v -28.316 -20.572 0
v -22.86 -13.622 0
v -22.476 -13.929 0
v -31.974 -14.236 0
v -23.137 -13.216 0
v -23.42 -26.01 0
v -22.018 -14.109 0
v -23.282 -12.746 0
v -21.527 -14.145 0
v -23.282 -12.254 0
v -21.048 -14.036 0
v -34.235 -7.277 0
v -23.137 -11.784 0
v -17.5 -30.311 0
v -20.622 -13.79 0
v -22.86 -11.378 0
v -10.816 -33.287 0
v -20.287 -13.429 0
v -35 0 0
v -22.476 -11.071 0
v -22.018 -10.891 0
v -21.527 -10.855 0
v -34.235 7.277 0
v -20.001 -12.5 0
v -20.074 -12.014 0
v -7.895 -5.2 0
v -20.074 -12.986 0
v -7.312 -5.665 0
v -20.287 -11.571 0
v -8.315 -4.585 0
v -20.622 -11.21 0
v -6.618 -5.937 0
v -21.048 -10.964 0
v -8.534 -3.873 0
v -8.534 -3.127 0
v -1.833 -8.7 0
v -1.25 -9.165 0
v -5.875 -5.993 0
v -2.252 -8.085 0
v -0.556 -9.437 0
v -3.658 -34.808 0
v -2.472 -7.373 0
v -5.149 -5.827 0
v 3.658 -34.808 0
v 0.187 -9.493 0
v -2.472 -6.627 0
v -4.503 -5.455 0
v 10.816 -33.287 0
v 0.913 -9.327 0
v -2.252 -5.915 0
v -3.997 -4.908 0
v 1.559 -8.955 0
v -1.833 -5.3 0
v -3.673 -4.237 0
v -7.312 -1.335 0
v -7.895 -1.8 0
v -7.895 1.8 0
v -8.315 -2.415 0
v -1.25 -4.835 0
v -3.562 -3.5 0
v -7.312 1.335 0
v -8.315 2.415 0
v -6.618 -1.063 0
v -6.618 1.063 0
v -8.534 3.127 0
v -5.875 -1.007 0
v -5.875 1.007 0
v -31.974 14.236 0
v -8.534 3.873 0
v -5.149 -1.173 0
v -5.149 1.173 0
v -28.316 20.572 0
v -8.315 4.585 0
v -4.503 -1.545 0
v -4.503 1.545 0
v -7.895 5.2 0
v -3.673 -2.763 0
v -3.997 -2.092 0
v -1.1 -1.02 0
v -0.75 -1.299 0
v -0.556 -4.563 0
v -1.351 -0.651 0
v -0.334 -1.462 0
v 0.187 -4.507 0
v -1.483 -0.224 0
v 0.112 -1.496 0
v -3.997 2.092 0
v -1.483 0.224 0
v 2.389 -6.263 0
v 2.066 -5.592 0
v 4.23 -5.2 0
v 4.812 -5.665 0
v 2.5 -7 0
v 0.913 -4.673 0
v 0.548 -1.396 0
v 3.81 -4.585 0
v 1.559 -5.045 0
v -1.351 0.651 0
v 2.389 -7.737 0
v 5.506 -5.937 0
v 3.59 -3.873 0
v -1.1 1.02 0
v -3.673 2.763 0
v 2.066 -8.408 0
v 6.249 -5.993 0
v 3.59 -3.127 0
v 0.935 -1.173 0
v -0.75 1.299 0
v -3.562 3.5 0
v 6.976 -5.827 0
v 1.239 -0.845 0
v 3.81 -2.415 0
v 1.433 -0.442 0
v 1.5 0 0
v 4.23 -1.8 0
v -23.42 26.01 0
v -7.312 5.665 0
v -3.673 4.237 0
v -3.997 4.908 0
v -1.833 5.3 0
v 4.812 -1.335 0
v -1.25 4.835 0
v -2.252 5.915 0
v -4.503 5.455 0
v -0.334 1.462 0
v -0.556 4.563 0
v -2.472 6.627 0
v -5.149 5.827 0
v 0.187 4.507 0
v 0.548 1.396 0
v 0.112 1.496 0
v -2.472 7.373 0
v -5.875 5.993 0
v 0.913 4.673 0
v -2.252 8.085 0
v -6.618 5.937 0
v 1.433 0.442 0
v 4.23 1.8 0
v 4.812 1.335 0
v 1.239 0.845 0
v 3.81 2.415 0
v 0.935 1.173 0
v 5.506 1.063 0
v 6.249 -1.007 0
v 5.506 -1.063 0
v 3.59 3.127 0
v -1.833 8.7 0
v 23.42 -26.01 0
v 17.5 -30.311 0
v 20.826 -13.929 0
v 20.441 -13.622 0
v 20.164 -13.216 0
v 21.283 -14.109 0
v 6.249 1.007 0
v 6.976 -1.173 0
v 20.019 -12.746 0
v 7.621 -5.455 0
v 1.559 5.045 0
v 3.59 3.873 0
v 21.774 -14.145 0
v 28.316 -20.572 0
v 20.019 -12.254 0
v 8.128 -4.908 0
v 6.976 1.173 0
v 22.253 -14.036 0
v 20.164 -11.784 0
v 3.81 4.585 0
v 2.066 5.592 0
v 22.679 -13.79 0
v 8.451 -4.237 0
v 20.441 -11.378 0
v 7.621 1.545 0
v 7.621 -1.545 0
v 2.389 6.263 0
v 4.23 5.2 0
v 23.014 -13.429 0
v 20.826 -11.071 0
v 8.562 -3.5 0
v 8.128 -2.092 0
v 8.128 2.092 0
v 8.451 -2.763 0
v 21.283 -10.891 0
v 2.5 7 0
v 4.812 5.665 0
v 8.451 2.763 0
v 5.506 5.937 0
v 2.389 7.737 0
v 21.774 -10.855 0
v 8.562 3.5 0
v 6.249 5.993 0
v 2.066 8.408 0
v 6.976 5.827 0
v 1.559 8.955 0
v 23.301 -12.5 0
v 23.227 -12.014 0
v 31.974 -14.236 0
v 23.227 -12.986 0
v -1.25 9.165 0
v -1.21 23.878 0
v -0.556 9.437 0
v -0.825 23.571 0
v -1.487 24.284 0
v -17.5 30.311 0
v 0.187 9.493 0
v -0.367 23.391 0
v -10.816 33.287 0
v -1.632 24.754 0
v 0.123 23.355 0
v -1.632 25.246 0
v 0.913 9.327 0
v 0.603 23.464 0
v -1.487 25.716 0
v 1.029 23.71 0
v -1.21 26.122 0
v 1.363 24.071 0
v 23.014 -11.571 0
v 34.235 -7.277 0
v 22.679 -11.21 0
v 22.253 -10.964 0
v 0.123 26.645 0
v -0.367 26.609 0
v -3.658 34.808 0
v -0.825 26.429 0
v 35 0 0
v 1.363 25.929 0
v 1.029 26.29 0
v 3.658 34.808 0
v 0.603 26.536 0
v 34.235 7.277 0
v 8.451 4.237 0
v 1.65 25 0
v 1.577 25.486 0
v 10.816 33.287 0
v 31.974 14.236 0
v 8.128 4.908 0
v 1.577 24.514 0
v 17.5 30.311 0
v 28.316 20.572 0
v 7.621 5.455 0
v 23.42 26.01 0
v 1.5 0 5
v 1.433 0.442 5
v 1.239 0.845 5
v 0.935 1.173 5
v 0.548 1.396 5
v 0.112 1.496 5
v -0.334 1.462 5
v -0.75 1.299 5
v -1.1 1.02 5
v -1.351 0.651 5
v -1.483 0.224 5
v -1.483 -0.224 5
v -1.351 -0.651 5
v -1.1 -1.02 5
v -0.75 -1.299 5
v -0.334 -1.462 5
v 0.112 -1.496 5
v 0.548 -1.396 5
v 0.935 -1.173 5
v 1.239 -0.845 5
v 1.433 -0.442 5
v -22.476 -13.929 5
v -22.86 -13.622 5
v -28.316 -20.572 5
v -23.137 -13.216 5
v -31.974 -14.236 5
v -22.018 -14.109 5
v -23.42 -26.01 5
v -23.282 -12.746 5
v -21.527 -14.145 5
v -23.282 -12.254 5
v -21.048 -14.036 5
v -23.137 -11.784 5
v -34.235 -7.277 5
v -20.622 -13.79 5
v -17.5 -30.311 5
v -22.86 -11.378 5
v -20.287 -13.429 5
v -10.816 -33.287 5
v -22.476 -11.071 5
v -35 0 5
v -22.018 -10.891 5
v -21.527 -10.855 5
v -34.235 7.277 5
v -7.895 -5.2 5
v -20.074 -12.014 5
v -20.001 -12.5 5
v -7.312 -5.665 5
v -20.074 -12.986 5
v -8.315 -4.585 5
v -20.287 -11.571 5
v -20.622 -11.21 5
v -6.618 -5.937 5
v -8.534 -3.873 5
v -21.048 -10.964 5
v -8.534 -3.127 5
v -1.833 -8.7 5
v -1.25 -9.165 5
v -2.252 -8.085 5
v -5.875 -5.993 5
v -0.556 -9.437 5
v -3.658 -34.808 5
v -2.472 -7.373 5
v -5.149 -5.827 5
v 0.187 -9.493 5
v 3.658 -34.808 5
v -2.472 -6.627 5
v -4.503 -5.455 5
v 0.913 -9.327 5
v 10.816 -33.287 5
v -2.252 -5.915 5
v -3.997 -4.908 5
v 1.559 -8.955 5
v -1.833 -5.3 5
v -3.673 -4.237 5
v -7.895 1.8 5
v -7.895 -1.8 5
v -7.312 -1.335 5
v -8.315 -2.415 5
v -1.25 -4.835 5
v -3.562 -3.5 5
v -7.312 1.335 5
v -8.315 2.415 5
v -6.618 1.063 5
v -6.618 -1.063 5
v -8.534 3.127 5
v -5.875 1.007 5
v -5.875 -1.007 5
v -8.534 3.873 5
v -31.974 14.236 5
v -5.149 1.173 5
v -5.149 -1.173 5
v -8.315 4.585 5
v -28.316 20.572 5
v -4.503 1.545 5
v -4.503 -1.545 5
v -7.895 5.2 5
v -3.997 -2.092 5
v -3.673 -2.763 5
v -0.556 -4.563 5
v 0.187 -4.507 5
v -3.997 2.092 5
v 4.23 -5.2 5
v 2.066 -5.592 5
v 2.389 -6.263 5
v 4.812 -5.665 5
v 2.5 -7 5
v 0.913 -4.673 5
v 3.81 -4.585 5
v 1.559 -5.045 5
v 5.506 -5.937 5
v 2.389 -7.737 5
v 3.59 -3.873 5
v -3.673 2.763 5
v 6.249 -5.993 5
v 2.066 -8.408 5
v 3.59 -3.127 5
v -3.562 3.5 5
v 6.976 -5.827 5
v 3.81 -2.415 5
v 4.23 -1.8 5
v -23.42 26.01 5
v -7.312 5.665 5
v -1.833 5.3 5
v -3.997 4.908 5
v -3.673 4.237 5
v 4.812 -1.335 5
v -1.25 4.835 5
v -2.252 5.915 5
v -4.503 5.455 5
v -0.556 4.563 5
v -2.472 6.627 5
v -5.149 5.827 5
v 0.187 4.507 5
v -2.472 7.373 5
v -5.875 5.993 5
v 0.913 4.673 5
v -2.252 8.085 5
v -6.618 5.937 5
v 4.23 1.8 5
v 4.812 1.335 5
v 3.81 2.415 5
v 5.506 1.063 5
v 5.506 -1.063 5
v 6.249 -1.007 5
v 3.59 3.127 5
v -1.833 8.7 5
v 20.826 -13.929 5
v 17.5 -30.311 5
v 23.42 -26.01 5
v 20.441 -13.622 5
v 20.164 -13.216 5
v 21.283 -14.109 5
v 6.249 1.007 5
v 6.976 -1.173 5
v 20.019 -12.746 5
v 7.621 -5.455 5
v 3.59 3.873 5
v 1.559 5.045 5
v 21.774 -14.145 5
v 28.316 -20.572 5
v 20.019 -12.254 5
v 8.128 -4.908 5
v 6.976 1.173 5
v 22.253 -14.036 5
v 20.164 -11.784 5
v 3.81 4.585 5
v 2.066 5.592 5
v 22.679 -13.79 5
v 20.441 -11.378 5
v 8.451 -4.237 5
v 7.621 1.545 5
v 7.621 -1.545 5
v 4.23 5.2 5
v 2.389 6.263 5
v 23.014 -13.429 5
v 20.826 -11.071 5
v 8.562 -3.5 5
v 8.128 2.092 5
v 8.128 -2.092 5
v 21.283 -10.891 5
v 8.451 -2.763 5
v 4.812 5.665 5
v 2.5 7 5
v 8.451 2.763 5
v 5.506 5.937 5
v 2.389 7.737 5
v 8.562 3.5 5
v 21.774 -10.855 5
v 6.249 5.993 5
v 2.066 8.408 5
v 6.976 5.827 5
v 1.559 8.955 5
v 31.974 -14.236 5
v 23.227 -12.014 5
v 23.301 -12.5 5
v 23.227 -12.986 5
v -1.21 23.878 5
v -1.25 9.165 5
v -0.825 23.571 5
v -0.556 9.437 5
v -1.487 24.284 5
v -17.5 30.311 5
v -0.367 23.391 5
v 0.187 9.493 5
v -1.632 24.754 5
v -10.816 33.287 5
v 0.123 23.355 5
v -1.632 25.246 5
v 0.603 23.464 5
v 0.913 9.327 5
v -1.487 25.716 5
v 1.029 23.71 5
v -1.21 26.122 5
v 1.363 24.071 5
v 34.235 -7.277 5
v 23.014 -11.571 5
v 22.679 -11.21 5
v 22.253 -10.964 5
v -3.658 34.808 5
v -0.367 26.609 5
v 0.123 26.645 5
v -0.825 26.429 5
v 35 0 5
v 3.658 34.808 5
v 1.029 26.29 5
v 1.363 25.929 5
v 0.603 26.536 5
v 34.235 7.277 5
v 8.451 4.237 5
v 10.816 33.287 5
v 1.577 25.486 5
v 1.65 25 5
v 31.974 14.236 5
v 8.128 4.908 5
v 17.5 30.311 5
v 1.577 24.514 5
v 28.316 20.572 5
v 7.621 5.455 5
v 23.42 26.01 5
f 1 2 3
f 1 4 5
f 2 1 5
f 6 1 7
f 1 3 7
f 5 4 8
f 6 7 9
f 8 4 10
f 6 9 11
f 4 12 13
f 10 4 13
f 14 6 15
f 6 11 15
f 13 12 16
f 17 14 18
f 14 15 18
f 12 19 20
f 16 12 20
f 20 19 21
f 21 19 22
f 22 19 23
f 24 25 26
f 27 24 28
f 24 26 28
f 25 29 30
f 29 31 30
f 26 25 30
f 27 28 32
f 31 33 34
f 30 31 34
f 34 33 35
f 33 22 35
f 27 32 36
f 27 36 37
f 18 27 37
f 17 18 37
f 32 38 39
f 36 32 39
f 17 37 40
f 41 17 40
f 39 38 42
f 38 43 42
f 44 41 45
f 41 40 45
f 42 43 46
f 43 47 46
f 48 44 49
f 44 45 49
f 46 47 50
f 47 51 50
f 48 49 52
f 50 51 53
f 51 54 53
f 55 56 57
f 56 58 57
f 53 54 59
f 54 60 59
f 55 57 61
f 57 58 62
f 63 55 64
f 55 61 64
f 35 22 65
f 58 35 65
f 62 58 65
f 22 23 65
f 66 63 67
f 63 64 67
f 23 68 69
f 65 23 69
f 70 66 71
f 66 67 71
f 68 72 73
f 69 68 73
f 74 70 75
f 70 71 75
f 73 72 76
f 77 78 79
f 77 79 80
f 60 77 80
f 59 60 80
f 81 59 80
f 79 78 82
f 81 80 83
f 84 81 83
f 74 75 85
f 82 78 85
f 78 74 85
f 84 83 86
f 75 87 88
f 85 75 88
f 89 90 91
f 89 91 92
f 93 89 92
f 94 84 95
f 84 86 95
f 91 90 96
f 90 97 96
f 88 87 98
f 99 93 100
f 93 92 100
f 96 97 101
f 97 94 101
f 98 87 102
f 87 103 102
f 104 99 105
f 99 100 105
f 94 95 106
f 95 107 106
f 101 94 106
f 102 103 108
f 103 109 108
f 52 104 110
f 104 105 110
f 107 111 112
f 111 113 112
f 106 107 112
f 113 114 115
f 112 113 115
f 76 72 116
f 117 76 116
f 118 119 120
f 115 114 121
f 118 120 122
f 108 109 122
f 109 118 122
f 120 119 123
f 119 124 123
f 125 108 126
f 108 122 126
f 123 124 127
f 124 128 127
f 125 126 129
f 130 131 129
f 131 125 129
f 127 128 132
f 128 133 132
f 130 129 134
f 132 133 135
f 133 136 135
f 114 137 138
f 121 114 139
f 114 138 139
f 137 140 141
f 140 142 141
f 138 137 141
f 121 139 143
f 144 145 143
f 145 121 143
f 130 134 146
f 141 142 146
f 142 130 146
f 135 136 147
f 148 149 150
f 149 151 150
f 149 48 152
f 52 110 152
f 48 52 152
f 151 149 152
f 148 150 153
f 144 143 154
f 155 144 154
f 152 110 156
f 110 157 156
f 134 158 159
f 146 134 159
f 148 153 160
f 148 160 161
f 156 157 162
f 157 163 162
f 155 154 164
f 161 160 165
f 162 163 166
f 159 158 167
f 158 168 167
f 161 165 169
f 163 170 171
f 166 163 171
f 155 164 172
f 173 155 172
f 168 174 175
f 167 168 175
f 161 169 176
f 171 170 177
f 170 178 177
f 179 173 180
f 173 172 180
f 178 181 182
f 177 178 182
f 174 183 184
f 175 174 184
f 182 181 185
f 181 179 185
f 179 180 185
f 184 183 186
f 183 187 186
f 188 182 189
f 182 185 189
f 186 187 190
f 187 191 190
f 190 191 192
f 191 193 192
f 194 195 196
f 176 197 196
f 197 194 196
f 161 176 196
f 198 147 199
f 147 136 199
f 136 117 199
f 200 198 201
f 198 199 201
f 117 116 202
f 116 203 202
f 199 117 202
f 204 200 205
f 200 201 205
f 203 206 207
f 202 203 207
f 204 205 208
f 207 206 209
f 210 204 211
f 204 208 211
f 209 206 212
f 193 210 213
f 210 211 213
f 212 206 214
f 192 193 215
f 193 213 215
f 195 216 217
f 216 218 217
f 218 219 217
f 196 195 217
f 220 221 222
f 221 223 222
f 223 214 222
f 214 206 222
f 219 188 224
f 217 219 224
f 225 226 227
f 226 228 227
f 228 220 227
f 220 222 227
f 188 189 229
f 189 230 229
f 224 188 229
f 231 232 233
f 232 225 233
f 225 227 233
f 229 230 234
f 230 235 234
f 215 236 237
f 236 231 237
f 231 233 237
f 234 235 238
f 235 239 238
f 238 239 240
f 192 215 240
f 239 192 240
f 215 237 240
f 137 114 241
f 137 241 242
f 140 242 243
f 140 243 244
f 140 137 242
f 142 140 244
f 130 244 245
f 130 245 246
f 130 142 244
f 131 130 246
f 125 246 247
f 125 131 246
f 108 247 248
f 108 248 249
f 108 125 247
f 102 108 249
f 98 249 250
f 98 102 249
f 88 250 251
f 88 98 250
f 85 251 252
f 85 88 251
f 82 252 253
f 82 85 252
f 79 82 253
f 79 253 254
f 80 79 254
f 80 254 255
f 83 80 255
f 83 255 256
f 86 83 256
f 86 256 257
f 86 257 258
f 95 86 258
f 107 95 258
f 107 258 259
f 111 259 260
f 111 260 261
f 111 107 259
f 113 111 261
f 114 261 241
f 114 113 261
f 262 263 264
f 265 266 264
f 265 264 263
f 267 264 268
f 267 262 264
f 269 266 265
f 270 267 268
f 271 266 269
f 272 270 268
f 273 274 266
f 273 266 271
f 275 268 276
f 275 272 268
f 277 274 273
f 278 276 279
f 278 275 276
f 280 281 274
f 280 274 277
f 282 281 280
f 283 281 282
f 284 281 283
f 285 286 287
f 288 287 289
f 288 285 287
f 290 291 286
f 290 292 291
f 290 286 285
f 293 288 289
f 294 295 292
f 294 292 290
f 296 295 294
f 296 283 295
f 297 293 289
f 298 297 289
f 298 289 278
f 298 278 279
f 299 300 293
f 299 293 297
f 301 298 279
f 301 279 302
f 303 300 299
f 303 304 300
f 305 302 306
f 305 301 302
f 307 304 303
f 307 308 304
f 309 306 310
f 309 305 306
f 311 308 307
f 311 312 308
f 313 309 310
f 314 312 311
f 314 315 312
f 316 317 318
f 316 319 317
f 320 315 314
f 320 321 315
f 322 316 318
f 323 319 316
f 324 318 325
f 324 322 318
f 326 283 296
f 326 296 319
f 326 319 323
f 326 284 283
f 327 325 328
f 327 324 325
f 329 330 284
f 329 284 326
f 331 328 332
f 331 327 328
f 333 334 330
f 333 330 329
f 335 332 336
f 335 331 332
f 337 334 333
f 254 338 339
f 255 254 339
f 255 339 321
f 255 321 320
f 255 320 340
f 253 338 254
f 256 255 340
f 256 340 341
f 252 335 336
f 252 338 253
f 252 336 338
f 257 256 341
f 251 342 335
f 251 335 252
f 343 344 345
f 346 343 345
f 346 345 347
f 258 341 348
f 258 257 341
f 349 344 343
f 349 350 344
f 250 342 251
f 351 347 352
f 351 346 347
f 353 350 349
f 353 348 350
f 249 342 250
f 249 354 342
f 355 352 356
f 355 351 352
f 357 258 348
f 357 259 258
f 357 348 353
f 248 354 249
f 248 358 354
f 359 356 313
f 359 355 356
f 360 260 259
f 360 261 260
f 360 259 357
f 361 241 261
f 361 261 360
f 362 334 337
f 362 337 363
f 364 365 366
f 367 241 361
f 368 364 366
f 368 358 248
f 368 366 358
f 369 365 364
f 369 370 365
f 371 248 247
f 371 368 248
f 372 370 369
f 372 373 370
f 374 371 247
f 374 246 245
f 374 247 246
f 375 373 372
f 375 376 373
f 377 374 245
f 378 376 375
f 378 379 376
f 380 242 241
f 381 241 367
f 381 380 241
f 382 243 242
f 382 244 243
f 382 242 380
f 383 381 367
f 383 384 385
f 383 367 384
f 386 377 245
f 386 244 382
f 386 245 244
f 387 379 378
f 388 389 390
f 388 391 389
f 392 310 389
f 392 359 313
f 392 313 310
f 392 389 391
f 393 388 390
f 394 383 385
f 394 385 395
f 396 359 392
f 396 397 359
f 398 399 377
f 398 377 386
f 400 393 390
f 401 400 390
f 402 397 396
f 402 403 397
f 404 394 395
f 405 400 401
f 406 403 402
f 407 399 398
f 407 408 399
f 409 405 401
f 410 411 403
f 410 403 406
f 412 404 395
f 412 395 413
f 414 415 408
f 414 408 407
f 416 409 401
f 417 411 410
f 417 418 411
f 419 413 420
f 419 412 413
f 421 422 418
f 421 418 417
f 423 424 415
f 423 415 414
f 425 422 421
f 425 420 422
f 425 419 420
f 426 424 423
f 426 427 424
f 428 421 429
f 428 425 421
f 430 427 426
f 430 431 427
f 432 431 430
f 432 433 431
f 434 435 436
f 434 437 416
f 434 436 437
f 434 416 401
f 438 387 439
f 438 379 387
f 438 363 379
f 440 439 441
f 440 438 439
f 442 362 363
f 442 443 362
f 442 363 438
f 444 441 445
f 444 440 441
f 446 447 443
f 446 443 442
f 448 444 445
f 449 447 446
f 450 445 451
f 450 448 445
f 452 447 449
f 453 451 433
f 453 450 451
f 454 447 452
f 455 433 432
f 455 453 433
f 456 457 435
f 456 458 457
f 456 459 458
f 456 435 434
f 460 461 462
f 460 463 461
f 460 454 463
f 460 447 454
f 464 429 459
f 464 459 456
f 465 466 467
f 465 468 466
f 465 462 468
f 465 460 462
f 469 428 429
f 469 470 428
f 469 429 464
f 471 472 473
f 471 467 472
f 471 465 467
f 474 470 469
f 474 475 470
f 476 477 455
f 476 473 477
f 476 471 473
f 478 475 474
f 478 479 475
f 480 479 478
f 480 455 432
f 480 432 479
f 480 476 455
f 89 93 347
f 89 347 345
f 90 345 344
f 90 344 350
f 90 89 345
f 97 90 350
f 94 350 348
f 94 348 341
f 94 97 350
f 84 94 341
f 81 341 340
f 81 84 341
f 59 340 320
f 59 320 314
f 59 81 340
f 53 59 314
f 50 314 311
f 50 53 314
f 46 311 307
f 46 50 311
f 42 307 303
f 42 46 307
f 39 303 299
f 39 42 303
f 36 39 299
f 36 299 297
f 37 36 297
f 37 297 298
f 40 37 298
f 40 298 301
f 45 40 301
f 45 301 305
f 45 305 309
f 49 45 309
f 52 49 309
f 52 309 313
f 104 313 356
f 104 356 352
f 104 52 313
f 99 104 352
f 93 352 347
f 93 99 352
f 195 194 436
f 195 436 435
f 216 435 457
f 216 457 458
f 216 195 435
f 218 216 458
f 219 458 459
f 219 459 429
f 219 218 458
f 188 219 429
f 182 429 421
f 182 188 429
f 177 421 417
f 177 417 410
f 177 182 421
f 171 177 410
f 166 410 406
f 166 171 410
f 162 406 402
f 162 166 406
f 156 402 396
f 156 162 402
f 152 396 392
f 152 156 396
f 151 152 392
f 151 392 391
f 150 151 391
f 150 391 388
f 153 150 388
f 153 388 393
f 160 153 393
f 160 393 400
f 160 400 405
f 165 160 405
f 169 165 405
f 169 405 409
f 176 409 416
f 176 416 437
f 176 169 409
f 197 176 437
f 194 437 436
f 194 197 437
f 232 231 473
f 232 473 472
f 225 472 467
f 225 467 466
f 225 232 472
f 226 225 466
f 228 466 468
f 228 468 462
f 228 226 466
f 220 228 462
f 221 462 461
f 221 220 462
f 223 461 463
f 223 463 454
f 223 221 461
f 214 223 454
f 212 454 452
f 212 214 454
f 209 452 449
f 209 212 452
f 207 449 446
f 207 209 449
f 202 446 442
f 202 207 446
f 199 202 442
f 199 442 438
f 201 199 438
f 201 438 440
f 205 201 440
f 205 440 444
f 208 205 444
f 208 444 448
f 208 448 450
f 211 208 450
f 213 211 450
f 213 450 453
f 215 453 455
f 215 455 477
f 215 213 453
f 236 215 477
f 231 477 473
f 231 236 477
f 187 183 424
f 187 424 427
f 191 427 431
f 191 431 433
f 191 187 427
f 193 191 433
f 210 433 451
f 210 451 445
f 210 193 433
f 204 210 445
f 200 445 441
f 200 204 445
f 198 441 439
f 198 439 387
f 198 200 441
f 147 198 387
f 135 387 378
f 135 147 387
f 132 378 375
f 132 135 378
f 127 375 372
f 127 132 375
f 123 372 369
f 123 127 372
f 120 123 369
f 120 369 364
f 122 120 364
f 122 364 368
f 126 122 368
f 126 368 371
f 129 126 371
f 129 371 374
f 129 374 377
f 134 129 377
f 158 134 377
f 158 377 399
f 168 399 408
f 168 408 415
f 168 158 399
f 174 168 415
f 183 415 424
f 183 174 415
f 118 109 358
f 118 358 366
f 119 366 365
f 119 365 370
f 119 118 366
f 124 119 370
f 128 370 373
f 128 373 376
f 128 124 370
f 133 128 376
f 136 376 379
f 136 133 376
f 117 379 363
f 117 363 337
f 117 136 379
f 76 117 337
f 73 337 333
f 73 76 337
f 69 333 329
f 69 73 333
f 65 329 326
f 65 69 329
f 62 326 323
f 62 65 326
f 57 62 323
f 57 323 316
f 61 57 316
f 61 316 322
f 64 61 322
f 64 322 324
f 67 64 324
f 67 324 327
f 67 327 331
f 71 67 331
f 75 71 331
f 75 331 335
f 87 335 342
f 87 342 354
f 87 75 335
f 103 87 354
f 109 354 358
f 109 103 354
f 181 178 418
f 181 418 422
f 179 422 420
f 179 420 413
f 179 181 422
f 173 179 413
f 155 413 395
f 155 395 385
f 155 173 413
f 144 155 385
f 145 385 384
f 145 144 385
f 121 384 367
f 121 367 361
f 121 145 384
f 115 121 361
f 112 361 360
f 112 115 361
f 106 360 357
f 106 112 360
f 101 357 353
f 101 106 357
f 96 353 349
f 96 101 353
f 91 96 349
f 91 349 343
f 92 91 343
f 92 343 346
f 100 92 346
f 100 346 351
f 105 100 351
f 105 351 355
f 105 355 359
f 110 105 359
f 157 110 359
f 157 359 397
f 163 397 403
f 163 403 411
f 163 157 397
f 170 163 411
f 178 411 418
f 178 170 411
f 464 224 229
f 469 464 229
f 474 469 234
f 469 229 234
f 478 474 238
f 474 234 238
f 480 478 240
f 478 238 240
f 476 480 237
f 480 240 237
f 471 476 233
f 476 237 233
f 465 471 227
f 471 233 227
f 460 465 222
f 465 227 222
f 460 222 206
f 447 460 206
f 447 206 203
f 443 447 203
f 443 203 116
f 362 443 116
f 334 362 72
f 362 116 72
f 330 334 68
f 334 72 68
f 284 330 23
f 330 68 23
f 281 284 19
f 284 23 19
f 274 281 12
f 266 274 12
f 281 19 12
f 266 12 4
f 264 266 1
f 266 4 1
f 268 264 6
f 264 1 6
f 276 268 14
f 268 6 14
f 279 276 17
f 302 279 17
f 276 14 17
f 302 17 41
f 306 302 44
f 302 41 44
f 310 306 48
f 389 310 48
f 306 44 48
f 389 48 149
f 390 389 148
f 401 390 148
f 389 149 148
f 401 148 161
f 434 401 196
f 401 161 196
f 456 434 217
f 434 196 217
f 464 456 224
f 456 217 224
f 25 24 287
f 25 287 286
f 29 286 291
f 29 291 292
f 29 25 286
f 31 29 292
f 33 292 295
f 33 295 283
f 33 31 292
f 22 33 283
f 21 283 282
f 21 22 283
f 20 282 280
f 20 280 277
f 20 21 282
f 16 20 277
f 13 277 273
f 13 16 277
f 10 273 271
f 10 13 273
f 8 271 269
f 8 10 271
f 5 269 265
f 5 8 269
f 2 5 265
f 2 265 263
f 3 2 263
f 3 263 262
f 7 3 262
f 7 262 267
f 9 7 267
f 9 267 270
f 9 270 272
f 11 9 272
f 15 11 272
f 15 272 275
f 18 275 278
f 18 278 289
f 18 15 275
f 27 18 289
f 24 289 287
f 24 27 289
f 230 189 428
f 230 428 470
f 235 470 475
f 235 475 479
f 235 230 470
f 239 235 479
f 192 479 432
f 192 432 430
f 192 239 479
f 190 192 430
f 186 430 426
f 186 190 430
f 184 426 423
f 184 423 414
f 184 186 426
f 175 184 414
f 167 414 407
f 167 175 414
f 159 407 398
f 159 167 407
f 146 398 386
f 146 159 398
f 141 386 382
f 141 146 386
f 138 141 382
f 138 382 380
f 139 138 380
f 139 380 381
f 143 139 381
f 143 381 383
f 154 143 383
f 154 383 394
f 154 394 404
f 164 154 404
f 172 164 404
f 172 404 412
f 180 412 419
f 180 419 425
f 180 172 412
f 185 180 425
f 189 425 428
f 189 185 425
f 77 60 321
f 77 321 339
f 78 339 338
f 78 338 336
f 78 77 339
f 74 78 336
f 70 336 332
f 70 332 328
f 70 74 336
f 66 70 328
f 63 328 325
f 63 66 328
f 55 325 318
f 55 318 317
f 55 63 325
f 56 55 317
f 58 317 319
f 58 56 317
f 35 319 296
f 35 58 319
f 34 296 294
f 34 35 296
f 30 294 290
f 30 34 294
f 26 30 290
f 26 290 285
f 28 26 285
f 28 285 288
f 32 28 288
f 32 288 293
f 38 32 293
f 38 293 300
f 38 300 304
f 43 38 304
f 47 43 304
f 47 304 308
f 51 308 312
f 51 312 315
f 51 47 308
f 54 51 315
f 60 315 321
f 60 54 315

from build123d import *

# Parameters (mm, degrees)
SKETCH1_R           = 35
SKETCH1_R_2         = 1.65
SKETCH1_R_3         = 1.5
SKETCH1_R_4         = 2.5
BOSS_EXTRUDE1_DEPTH = 5


with BuildPart() as part:
    # Sketch1 → Boss-Extrude1 (new body)
    with BuildSketch(Plane.XY):
        Circle(SKETCH1_R)
        with Locations((0, 25)):
            Circle(SKETCH1_R_2, mode=Mode.SUBTRACT)
        with Locations((21.650635095, -12.5)):
            Circle(SKETCH1_R_2, mode=Mode.SUBTRACT)
        with Locations((-21.650635095, -12.5)):
            Circle(SKETCH1_R_2, mode=Mode.SUBTRACT)
        Circle(SKETCH1_R_3, mode=Mode.SUBTRACT)
        with Locations((0, 7)):
            Circle(SKETCH1_R_4, mode=Mode.SUBTRACT)
        with Locations((6.062177826, 3.5)):
            Circle(SKETCH1_R_4, mode=Mode.SUBTRACT)
        with Locations((6.062177826, -3.5)):
            Circle(SKETCH1_R_4, mode=Mode.SUBTRACT)
        with Locations((0, -7)):
            Circle(SKETCH1_R_4, mode=Mode.SUBTRACT)
        with Locations((-6.062177826, -3.5)):
            Circle(SKETCH1_R_4, mode=Mode.SUBTRACT)
        with Locations((-6.062177826, 3.5)):
            Circle(SKETCH1_R_4, mode=Mode.SUBTRACT)
    extrude(amount=BOSS_EXTRUDE1_DEPTH)


solid = part.part
